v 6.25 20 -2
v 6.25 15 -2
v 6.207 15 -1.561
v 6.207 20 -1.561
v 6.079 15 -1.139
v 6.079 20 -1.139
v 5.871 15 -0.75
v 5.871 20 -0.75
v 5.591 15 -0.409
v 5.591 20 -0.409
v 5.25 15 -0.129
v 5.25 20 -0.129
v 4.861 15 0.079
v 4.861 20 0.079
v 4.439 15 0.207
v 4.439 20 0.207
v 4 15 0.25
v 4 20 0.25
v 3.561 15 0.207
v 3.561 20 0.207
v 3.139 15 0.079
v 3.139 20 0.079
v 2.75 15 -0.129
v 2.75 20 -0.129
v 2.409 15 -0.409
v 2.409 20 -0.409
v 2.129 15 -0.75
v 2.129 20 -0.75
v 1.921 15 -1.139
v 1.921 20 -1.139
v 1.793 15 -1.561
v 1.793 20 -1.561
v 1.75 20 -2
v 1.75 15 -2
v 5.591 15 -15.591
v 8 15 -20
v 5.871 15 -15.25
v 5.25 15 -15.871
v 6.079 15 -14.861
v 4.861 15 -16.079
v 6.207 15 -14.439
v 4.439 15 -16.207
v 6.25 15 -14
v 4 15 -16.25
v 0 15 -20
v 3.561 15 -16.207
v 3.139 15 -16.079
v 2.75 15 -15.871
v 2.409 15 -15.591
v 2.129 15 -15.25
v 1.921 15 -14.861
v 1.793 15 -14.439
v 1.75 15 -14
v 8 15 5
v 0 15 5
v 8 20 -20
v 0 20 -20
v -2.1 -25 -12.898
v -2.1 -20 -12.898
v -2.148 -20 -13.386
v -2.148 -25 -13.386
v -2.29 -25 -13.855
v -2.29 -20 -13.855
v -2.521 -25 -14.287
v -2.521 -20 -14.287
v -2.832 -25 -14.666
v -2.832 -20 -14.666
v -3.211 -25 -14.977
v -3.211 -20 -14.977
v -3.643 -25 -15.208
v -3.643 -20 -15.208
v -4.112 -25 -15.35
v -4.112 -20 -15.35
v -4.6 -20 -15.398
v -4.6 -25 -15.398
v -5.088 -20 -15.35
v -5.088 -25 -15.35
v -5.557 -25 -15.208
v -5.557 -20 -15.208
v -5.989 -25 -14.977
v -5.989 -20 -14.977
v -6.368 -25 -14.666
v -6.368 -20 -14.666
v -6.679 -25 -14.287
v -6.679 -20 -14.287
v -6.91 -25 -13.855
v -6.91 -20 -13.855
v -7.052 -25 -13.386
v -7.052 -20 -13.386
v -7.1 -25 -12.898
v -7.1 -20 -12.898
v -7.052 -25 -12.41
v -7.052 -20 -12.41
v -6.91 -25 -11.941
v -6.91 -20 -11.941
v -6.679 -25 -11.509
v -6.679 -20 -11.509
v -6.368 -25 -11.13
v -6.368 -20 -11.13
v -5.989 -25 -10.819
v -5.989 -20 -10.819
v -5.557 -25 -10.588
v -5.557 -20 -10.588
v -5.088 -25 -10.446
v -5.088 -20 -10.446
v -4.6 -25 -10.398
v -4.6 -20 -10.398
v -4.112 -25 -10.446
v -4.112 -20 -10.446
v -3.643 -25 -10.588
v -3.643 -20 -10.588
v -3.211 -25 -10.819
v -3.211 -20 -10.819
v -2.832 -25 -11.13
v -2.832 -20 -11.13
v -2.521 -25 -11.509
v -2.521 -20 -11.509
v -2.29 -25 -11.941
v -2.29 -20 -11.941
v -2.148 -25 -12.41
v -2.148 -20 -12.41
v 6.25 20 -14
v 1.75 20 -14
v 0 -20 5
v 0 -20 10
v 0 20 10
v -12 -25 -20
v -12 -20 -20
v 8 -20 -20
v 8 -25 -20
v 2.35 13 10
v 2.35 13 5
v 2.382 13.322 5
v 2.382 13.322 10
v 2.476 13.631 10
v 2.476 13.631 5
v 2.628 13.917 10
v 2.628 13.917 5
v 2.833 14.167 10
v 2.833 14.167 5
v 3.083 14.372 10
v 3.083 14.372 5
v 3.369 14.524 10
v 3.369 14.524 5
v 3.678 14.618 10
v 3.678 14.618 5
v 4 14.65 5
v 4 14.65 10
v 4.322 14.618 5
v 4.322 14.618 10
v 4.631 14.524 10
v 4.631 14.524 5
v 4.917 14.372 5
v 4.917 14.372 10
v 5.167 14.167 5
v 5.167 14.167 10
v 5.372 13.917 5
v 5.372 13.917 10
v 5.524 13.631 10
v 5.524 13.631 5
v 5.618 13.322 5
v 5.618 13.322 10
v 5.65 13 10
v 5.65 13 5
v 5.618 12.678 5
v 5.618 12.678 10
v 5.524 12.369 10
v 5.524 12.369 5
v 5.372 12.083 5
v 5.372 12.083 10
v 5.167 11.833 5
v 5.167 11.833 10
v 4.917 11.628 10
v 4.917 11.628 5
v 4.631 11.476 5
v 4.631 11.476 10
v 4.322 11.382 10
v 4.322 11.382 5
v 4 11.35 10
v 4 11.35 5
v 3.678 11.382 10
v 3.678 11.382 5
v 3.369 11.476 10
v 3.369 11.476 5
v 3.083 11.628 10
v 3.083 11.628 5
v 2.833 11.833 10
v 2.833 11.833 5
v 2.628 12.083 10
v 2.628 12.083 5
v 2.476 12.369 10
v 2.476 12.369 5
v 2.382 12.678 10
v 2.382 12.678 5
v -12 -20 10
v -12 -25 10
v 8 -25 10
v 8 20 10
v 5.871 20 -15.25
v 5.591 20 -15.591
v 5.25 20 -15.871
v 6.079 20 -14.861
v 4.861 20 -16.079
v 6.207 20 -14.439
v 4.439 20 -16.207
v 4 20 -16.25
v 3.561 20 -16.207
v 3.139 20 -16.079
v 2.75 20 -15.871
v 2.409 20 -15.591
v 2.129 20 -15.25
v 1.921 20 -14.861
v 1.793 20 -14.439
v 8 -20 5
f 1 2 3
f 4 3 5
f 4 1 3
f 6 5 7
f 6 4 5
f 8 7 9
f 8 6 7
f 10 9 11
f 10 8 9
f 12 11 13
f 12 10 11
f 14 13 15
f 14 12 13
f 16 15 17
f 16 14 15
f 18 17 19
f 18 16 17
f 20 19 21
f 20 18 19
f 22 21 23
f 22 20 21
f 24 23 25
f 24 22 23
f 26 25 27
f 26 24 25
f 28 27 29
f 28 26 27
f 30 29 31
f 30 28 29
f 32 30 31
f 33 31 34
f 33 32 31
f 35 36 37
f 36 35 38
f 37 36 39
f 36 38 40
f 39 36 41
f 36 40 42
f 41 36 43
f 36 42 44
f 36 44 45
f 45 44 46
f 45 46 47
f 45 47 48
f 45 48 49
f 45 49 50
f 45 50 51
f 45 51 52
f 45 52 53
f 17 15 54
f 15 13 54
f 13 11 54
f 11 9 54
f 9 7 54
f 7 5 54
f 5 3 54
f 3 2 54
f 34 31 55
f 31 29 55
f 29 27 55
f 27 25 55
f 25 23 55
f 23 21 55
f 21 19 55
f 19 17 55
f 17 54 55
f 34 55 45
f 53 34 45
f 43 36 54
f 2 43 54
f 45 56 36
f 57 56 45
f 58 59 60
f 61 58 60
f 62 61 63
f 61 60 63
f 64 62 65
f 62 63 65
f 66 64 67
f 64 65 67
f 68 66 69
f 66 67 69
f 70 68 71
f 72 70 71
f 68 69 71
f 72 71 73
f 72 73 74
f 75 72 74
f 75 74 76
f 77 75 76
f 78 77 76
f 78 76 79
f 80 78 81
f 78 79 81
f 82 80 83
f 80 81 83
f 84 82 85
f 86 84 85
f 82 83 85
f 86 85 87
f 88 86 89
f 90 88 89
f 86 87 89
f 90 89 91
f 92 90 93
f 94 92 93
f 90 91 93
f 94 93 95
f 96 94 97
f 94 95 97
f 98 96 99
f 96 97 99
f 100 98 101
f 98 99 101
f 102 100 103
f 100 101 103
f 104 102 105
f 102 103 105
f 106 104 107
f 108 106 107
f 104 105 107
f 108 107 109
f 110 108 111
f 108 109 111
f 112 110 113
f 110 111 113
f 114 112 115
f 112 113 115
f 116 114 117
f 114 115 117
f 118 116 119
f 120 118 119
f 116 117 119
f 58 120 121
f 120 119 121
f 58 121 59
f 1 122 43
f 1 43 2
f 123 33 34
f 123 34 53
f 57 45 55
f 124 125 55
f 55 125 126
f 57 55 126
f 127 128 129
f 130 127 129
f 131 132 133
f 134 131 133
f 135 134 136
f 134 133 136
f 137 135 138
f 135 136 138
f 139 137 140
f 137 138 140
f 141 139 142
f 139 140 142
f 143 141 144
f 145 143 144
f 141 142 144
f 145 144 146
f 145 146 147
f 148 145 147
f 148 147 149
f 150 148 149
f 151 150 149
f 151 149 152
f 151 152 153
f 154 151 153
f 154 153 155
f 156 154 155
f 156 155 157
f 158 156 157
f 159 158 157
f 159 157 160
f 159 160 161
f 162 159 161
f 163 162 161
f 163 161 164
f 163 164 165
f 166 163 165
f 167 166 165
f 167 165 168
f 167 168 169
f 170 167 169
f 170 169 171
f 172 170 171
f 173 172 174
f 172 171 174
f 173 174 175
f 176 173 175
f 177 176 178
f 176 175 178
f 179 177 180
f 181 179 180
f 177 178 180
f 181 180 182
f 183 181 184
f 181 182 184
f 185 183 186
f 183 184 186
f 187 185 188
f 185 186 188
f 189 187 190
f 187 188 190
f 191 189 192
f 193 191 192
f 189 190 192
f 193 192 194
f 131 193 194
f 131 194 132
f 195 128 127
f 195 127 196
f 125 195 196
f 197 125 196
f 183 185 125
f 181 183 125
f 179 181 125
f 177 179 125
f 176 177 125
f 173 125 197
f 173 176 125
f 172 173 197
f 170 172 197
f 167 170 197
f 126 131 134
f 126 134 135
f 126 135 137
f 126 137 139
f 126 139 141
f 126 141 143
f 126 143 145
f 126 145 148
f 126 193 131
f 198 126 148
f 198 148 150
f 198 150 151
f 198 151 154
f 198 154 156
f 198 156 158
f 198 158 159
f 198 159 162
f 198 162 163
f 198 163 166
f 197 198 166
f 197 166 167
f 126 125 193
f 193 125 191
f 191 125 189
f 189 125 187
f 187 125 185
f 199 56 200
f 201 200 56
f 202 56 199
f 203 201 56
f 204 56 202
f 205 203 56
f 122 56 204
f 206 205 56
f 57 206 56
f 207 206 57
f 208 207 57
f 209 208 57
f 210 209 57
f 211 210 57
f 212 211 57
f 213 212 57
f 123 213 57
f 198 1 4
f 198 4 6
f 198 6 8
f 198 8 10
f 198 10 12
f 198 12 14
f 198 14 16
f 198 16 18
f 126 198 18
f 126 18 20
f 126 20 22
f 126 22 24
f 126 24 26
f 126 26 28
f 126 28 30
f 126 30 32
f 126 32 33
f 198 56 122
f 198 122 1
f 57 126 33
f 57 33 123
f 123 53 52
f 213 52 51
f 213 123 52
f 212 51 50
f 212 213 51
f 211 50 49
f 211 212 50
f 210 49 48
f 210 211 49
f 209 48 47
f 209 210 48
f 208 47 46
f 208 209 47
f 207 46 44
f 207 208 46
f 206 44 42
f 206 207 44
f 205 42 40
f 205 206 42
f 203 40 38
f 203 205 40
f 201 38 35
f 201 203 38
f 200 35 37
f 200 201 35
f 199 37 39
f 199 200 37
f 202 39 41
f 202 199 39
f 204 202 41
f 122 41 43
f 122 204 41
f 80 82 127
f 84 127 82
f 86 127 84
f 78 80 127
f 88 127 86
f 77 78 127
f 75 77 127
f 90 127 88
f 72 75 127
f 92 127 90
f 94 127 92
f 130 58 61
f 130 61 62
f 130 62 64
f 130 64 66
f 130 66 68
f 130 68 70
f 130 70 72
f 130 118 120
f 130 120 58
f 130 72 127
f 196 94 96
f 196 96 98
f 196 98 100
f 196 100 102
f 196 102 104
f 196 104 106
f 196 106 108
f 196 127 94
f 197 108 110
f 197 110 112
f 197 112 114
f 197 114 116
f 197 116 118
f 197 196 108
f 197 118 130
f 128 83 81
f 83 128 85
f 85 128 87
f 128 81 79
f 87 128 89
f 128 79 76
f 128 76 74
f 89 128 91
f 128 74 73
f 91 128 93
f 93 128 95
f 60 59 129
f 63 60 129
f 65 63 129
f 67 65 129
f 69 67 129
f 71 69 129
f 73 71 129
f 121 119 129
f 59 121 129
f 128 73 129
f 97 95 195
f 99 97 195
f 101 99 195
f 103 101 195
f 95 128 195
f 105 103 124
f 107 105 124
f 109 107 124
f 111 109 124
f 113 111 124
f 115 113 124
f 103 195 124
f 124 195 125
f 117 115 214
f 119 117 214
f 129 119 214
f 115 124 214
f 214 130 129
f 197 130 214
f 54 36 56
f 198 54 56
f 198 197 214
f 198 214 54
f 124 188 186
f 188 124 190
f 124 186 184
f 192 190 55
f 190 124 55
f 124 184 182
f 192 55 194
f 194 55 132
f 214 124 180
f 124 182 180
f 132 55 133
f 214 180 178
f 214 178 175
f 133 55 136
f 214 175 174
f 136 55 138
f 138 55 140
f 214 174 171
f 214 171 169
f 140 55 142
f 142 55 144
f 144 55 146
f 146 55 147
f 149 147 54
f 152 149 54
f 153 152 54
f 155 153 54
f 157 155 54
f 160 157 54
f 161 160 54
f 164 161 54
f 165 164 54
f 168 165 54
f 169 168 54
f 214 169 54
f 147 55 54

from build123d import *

# Parameters (mm, degrees)
SKETCH_1_W             = 8
SKETCH_1_H             = 20
EXTRUDE_1_DEPTH        = 10
SKETCH_2_W             = 5
SKETCH_2_H             = 15
CUT_EXTRUDE_1_DEPTH    = 10
SKETCH_3_W             = 8
SKETCH_3_H             = 5
EXTRUDE_2_DEPTH        = 5
SKETCH_4_W             = 8
SKETCH_4_H             = 5
EXTRUDE_3_DEPTH        = 20
SKETCH_5_W             = 20
SKETCH_5_H             = 30
EXTRUDE_4_DEPTH        = 5
SKETCH_6_R             = 2.5
CUT_EXTRUDE_2_DEPTH    = 5
SKETCH_7_W             = 8
SKETCH_7_H             = 5
EXTRUDE_5_DEPTH        = 15
CUT_EXTRUDE_3_DEPTH    = 10
HOLE_WIZARD_M4_1_D     = 3.3
HOLE_WIZARD_M4_1_DEPTH = 10.1
HOLE_WIZARD_M4_1_TIP   = 0.991420021


with BuildPart() as part:
    # 草图1 → 凸台-拉伸1 (new body)
    with BuildSketch(Plane.XY):
        with Locations((4, 10)):
            Rectangle(SKETCH_1_W, SKETCH_1_H)
    extrude(amount=EXTRUDE_1_DEPTH)

    # 草图2 → 切除-拉伸1 (cut)
    with BuildSketch(Plane.ZY):
        with Locations((2.5, 7.5)):
            Rectangle(SKETCH_2_W, SKETCH_2_H)
    extrude(amount=-CUT_EXTRUDE_1_DEPTH, mode=Mode.SUBTRACT)

    # 草图3 → 凸台-拉伸2 (add)
    with BuildSketch(Plane(origin=(0, 0, 0), x_dir=(-1, 0, 0), z_dir=(0, 0, -1))):
        with Locations((-4, 17.5)):
            Rectangle(SKETCH_3_W, SKETCH_3_H)
    extrude(amount=EXTRUDE_2_DEPTH)

    # 草图4 → 凸台-拉伸3 (add)
    with BuildSketch(Plane.XZ):
        with Locations((4, 7.5)):
            Rectangle(SKETCH_4_W, SKETCH_4_H)
    extrude(amount=EXTRUDE_3_DEPTH)

    # 草图5 → 凸台-拉伸4 (add)
    with BuildSketch(Plane.XZ.offset(20)):
        with Locations((-2, -5)):
            Rectangle(SKETCH_5_W, SKETCH_5_H)
    extrude(amount=EXTRUDE_4_DEPTH)

    # 草图6 → 切除-拉伸2 (cut)
    with BuildSketch(Plane(origin=(0, -20, 0), x_dir=(1, 0, 0), z_dir=(0, 1, 0))):
        with Locations((-4.6, 12.897897411)):
            Circle(SKETCH_6_R)
    extrude(amount=-CUT_EXTRUDE_2_DEPTH, mode=Mode.SUBTRACT)

    # 草图7 → 凸台-拉伸5 (add)
    with BuildSketch(Plane(origin=(0, 0, -5), x_dir=(-1, 0, 0), z_dir=(0, 0, -1))):
        with Locations((-4, 17.5)):
            Rectangle(SKETCH_7_W, SKETCH_7_H)
    extrude(amount=EXTRUDE_5_DEPTH)

    # 草图8 → 切除-拉伸3 (cut)
    with BuildSketch(Plane(origin=(0, 20, 0), x_dir=(1, 0, 0), z_dir=(0, 1, 0))):
        with BuildLine():
            Line((6.25, 14), (6.25, 2))
            ThreePointArc((6.25, 2), (4, -0.25), (1.75, 2))
            Line((1.75, 2), (1.75, 14))
            ThreePointArc((1.75, 14), (4, 16.25), (6.25, 14))
        make_face()
    extrude(amount=-CUT_EXTRUDE_3_DEPTH, mode=Mode.SUBTRACT)

    # M4 螺纹孔1
    with Locations(Plane.XY.offset(10)):
        with Locations((4, 13)):
            Hole(HOLE_WIZARD_M4_1_D / 2, depth=HOLE_WIZARD_M4_1_DEPTH)
            with Locations((0, 0, -(HOLE_WIZARD_M4_1_DEPTH + HOLE_WIZARD_M4_1_TIP / 2))):  # 118° drill point
                Cone(0, HOLE_WIZARD_M4_1_D / 2, HOLE_WIZARD_M4_1_TIP, mode=Mode.SUBTRACT)


solid = part.part
